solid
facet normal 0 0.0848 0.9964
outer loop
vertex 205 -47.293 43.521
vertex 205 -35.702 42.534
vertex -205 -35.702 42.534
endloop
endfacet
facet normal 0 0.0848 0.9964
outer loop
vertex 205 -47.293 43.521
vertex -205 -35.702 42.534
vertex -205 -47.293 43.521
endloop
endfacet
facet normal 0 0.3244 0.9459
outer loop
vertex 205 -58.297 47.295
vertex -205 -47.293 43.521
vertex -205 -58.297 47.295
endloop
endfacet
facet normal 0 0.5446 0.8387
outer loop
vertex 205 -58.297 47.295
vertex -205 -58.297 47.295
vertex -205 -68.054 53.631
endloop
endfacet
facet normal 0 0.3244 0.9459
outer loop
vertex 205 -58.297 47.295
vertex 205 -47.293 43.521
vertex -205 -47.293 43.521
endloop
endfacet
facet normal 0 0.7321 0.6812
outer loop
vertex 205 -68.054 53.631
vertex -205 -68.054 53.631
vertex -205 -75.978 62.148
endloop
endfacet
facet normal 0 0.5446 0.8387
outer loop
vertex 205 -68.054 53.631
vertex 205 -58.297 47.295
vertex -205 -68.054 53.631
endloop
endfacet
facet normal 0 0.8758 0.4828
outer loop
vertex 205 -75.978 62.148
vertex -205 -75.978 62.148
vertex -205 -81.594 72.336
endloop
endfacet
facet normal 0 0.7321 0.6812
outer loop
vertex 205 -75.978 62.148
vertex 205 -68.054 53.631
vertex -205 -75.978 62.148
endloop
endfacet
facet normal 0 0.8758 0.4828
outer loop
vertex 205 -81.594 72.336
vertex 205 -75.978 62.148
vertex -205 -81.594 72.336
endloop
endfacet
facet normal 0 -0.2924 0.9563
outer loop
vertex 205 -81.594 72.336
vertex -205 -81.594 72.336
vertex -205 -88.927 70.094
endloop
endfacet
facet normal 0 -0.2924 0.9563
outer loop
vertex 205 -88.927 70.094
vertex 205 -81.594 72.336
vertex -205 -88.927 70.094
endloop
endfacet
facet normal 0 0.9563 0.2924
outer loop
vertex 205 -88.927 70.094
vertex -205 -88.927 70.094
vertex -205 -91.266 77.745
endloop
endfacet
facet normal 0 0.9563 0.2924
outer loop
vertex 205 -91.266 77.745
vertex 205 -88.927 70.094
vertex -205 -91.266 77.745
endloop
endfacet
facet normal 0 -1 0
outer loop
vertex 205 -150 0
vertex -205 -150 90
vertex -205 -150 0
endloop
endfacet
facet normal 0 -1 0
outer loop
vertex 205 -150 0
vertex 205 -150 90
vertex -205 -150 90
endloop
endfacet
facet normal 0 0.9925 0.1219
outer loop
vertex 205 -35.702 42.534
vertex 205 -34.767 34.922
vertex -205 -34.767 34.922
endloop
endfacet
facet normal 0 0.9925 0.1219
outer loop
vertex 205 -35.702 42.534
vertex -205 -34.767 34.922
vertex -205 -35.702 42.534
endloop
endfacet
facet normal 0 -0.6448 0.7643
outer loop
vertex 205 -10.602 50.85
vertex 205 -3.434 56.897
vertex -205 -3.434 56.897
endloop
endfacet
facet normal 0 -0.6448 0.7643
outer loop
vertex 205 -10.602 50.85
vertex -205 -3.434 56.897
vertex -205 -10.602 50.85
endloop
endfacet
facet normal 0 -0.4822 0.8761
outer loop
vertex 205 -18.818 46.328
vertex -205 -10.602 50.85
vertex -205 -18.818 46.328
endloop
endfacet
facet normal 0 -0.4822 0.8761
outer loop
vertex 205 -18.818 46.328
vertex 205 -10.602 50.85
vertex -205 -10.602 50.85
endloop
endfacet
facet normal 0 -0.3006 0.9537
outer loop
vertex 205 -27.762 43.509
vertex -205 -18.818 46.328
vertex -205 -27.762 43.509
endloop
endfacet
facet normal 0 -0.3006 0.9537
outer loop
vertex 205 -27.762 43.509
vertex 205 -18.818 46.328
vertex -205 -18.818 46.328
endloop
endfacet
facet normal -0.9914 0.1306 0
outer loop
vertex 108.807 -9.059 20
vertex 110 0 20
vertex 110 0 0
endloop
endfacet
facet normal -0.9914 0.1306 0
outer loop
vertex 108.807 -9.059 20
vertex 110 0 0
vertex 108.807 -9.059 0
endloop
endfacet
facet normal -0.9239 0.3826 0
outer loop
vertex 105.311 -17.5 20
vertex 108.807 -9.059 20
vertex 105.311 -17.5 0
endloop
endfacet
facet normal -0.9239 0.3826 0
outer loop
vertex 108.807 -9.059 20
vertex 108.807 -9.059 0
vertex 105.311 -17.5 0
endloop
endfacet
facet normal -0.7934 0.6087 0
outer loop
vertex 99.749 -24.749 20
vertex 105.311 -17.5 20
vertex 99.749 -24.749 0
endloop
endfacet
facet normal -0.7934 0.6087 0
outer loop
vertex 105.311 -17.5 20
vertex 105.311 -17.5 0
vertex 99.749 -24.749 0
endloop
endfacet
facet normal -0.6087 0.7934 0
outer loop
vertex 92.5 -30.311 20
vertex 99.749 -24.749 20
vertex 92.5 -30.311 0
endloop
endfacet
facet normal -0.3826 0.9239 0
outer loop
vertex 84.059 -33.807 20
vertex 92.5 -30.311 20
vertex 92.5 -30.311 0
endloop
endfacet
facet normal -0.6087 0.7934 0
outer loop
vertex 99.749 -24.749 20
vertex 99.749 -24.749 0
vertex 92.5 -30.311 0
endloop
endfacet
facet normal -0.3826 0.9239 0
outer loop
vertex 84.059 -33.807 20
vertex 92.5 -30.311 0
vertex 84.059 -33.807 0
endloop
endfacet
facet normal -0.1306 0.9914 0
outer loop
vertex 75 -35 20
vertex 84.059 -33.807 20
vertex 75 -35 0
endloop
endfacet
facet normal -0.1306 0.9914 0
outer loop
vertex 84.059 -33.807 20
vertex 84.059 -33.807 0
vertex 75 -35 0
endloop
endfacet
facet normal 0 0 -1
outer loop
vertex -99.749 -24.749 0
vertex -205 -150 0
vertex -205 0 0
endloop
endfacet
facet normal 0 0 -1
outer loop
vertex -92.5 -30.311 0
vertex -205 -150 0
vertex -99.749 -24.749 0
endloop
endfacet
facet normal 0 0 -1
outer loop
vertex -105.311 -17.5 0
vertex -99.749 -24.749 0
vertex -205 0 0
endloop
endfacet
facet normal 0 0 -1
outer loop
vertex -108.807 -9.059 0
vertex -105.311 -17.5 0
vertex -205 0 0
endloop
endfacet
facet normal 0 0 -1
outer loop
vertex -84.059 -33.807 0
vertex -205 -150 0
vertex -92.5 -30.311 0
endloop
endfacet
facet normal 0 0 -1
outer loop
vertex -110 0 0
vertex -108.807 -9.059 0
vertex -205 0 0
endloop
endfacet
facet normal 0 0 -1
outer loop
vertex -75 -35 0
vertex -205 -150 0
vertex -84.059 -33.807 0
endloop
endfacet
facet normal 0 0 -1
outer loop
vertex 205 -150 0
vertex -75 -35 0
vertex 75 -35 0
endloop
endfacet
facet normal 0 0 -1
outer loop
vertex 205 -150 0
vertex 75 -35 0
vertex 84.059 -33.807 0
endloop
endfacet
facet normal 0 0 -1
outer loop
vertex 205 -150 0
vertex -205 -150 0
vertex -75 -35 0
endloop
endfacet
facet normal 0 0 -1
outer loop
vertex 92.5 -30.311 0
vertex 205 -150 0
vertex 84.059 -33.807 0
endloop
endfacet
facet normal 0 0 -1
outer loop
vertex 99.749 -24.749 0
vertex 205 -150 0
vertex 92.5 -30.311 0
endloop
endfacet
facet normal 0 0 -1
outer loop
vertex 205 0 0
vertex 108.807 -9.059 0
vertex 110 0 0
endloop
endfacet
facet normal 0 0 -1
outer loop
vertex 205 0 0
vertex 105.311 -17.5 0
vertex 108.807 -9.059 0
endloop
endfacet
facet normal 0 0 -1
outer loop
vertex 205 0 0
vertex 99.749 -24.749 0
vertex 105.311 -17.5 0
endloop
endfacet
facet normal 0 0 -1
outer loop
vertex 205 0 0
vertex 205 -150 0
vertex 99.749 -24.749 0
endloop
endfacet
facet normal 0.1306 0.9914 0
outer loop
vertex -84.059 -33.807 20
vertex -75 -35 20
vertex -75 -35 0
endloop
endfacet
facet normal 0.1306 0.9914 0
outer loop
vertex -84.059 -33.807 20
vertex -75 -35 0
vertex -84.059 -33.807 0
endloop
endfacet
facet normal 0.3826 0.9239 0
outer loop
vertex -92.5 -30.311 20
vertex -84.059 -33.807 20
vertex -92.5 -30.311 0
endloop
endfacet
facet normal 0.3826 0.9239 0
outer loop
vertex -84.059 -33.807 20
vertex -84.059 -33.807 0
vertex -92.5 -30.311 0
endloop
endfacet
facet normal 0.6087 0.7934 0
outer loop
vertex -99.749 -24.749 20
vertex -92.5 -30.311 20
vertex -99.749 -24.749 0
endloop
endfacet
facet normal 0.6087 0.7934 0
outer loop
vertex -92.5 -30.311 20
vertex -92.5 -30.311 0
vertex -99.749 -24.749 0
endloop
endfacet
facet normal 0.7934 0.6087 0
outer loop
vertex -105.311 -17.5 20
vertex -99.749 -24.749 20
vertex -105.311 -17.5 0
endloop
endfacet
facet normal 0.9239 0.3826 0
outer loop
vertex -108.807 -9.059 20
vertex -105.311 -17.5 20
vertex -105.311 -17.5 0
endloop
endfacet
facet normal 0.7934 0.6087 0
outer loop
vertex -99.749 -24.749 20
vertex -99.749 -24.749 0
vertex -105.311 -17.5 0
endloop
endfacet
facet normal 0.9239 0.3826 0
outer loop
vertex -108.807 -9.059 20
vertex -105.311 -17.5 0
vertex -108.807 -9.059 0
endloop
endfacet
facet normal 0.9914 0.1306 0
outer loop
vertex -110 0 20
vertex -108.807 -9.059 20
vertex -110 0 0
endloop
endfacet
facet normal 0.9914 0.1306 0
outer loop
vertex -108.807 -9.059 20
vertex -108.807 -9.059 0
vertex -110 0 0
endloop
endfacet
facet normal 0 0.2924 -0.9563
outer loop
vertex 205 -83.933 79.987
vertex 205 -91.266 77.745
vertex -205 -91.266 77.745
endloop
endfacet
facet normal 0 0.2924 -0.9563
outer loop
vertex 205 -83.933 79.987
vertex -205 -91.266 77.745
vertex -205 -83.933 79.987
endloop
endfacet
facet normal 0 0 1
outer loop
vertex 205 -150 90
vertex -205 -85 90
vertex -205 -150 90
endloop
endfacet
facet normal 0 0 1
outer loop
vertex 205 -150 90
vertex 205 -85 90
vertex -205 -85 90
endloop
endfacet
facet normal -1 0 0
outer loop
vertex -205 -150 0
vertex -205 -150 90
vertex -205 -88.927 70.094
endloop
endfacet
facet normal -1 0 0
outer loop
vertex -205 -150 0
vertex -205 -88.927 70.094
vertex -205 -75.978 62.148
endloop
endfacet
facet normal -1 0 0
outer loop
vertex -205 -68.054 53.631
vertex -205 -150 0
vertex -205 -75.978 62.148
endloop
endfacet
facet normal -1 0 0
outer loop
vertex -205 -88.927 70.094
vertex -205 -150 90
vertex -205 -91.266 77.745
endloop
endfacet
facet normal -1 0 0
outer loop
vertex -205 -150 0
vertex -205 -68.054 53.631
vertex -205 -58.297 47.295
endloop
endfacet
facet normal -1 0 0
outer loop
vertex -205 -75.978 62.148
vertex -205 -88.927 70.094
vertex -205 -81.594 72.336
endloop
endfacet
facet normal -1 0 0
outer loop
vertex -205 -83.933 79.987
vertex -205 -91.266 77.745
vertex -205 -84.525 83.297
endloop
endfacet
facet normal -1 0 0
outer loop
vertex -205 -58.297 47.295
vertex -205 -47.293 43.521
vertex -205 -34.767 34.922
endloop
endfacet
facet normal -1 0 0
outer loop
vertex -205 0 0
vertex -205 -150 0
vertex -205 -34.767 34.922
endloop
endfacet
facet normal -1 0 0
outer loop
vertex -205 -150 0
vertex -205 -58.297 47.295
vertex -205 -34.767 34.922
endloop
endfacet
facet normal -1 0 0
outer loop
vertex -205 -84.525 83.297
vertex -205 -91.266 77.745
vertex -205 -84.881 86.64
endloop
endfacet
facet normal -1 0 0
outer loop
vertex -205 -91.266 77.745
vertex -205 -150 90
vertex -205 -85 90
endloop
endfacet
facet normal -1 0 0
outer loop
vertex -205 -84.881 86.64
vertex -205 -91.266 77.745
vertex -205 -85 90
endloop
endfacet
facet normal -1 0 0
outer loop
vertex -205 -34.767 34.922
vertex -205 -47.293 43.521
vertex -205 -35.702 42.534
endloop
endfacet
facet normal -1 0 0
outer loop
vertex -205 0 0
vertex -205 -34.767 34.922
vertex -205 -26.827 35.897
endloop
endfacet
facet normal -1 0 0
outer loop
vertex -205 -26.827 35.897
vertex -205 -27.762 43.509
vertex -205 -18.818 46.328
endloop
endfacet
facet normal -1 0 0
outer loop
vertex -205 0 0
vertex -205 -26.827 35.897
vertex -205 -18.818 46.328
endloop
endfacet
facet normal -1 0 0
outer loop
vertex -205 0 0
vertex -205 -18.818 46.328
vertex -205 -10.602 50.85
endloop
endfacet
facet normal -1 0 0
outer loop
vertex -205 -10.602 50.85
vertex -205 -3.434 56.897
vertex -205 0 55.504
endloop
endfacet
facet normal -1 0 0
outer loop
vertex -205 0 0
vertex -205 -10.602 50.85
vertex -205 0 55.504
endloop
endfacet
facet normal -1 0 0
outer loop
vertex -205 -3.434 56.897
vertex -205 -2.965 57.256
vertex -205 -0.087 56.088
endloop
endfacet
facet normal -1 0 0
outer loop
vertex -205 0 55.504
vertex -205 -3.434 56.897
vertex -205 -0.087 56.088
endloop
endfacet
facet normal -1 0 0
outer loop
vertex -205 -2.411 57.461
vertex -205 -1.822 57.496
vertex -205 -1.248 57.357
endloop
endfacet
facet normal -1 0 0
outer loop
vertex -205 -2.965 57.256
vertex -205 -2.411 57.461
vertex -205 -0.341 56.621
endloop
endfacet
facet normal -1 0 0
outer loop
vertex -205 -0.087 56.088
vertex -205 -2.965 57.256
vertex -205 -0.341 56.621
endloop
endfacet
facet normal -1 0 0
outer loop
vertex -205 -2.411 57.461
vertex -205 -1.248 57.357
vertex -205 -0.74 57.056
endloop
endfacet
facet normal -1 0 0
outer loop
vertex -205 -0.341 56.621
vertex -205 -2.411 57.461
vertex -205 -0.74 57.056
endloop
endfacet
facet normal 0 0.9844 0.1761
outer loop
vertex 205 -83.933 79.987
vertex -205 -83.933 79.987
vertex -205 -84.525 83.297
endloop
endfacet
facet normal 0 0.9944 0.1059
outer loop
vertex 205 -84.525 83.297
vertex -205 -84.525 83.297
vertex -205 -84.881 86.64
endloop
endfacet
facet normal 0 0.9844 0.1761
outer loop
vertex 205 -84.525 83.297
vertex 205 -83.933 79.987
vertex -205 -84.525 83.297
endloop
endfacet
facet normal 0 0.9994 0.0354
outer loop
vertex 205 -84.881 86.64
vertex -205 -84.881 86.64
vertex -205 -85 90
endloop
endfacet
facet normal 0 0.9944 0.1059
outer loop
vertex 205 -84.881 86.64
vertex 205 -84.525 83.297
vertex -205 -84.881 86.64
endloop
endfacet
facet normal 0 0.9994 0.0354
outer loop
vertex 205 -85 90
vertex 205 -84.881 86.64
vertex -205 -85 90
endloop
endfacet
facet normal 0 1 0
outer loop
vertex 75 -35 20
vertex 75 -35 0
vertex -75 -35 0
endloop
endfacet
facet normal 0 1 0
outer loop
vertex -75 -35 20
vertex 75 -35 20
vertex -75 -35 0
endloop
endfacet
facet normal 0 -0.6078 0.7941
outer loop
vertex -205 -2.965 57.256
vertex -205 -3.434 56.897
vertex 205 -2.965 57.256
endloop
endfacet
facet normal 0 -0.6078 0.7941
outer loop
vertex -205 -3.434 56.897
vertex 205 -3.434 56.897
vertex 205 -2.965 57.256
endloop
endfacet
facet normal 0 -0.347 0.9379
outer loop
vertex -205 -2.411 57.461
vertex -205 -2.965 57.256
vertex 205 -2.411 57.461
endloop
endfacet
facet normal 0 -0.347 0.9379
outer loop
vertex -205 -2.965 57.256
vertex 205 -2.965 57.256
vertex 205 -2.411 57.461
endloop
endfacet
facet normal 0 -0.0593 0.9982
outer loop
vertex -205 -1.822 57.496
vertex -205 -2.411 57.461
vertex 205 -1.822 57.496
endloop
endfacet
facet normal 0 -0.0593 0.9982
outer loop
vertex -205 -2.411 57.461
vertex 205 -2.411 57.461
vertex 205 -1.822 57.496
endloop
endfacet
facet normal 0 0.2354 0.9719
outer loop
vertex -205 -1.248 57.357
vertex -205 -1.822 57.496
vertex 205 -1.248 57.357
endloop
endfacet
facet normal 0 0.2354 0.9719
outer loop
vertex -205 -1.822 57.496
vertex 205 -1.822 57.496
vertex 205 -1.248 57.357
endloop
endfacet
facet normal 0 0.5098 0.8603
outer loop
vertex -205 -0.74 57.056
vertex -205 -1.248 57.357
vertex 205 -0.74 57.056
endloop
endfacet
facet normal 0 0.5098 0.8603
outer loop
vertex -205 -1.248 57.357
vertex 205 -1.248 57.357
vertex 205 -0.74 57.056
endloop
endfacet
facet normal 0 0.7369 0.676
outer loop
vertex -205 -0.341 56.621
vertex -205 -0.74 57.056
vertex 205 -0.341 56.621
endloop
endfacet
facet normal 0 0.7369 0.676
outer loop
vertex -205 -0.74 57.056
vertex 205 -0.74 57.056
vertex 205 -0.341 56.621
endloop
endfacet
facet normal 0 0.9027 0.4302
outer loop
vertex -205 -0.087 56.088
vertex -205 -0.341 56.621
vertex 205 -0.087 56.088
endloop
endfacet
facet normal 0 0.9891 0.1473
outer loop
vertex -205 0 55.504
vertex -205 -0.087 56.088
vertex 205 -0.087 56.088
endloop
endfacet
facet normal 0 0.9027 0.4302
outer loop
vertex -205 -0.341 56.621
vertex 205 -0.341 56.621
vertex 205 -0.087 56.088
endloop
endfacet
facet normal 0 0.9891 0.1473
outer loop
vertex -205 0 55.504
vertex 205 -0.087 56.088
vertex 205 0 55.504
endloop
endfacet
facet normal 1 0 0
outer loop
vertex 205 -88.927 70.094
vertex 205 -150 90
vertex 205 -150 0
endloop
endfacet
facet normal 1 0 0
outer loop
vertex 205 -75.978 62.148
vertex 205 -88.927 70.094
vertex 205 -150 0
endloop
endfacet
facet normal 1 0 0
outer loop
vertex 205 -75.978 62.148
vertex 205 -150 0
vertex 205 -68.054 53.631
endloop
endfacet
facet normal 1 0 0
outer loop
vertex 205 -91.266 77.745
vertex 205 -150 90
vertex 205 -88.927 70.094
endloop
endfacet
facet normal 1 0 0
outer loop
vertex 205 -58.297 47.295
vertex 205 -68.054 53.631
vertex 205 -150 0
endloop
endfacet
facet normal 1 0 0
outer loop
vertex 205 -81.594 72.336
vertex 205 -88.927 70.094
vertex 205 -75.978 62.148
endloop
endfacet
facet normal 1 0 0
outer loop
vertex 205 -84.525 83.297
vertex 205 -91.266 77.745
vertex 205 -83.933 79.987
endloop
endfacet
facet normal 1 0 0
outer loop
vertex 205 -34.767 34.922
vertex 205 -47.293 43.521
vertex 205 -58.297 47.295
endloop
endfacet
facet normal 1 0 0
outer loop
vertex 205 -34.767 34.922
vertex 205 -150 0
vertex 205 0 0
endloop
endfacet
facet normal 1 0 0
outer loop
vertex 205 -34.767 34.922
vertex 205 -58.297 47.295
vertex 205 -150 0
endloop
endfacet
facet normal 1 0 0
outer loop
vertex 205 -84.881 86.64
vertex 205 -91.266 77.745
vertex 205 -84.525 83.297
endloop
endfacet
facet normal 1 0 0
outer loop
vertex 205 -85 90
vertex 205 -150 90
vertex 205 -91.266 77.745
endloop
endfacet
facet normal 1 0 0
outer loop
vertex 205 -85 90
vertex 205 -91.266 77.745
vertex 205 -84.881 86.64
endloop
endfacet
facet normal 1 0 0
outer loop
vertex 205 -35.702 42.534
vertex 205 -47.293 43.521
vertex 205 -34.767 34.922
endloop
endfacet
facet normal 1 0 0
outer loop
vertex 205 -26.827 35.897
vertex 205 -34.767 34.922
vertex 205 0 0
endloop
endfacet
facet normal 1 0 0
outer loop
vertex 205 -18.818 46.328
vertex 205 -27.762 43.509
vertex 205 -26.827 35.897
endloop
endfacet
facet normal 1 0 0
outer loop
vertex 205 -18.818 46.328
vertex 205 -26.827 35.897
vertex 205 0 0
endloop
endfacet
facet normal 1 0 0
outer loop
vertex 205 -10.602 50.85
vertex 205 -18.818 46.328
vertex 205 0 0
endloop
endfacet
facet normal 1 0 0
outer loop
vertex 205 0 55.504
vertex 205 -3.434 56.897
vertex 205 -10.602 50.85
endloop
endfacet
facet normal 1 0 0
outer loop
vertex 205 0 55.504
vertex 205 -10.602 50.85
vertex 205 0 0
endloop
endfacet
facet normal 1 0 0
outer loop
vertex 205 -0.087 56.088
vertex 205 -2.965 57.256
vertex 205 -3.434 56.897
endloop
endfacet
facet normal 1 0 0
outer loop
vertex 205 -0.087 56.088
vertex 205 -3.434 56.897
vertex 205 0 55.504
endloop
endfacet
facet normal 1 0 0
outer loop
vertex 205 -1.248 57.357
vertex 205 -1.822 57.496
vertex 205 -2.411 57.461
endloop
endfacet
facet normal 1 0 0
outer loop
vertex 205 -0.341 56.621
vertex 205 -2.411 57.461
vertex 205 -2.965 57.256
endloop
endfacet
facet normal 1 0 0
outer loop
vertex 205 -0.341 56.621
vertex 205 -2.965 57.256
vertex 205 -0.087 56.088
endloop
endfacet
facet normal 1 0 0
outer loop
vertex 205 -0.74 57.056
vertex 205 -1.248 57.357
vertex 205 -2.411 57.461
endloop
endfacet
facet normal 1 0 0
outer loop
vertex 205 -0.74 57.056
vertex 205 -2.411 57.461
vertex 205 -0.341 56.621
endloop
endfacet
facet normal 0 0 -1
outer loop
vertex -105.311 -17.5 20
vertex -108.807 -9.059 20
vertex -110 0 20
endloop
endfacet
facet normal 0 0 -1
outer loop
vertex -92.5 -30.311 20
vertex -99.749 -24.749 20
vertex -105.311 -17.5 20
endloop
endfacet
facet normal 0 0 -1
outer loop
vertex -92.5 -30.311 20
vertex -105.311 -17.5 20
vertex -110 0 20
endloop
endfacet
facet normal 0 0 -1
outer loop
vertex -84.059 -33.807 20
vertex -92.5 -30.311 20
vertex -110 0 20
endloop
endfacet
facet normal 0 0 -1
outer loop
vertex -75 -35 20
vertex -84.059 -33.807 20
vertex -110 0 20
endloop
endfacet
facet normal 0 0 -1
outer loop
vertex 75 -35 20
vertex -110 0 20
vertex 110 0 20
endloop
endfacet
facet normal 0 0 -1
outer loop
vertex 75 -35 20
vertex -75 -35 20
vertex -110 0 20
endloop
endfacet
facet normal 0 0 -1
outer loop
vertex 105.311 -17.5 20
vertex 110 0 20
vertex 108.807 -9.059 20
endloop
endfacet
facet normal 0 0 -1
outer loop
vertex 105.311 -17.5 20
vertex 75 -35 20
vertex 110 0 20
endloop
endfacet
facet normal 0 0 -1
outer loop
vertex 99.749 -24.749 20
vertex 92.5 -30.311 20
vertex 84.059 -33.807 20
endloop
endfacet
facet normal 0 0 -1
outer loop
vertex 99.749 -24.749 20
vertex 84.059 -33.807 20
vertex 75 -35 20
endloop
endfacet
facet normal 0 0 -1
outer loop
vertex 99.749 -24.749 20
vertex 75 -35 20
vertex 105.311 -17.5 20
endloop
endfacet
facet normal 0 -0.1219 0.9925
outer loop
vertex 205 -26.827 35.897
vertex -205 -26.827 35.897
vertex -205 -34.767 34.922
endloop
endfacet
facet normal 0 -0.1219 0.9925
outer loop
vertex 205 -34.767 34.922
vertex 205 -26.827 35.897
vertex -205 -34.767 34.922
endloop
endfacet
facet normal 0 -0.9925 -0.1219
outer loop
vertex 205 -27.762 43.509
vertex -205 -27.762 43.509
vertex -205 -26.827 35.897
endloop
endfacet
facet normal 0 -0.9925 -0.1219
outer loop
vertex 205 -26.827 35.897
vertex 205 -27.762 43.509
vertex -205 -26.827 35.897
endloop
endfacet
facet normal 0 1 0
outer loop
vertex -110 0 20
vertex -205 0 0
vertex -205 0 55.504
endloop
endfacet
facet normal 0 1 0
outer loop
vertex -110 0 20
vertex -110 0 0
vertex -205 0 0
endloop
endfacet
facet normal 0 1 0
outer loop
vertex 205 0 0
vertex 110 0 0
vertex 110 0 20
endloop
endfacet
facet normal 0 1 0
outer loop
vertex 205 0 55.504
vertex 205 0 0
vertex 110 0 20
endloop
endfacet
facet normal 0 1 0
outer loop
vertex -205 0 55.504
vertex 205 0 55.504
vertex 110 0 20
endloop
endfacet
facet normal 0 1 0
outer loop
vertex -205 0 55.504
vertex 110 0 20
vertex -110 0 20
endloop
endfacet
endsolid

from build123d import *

# Parameters (mm, degrees)
F1_DEPTH = 205
F2_R     = 2
F4_DEPTH = 20
F6_DEPTH = 410.001


with BuildPart() as f1:
    # F0 (on Right) → F1 (new body, symmetric)
    with BuildSketch(Plane.YZ):
        with BuildLine():
            Line((-150, 0), (0, 0))
            Line((0, 0), (0, 60.8452405258))
            ThreePointArc((0, 60.8452405258), (-52.9110350074, 45.069498111), (-85, 90))
            Line((-85, 90), (-150, 90))
            Line((-150, 90), (-150, 0))
        make_face()
    extrude(amount=F1_DEPTH, both=True)

    # F2
    f2_edges = [f1.edges().sort_by_distance(p)[0] for p in [
        (0, 0, 60.845241),
    ]]
    fillet(f2_edges, radius=F2_R)

    # F3 (on face) → F4 (cut)
    with BuildSketch(Plane(origin=(0, 0, 0), x_dir=(1, 0, 0), z_dir=(0, 0, -1))):
        with BuildLine():
            ThreePointArc((110, 0), (99.7487373415, 24.7487373415), (75, 35))
            Line((75, 35), (-75, 35))
            ThreePointArc((-75, 35), (-99.7487373415, 24.7487373415), (-110, 0))
            Line((-110, 0), (110, 0))
        make_face()
        with BuildLine():
            ThreePointArc((75, -35), (99.7487373415, -24.7487373415), (110, 0))
            Line((110, 0), (-110, 0))
            ThreePointArc((-110, 0), (-99.7487373415, -24.7487373415), (-75, -35))
            Line((-75, -35), (75, -35))
        make_face()
    extrude(amount=-F4_DEPTH, mode=Mode.SUBTRACT)

    # F5 (on face) → F6 (cut, through all)
    with BuildSketch(Plane(origin=(-205, 0, 0), x_dir=(0, -1, 0), z_dir=(-1, 0, 0))):
        with BuildLine():
            ThreePointArc((35.701952676, 42.5340435067), (31.7112061883, 42.854057797), (27.7615834628, 43.508998254))
            Line((27.7615834628, 43.508998254), (26.8270015062, 35.8974390333))
            Line((26.8270015062, 35.8974390333), (34.7673707193, 34.9224842861))
            Line((34.7673707193, 34.9224842861), (35.701952676, 42.5340435067))
        make_face()
        with BuildLine():
            ThreePointArc((81.5936406798, 72.336454161), (82.9244759082, 76.1123440257), (83.9326143175, 79.9868922087))
            Line((83.9326143175, 79.9868922087), (78.6335187107, 81.6069883197))
            Line((78.6335187107, 81.6069883197), (76.294545073, 73.956550272))
            Line((76.294545073, 73.956550272), (81.5936406798, 72.336454161))
        make_face()
        with BuildLine():
            Line((91.2662483969, 77.7447752641), (83.9326143175, 79.9868922087))
            ThreePointArc((83.9326143175, 79.9868922087), (82.9244759082, 76.1123440257), (81.5936406798, 72.336454161))
            Line((81.5936406798, 72.336454161), (88.9272747591, 70.0943372164))
            Line((88.9272747591, 70.0943372164), (91.2662483969, 77.7447752641))
        make_face()
    extrude(amount=-F6_DEPTH, mode=Mode.SUBTRACT)


solid = f1.part
